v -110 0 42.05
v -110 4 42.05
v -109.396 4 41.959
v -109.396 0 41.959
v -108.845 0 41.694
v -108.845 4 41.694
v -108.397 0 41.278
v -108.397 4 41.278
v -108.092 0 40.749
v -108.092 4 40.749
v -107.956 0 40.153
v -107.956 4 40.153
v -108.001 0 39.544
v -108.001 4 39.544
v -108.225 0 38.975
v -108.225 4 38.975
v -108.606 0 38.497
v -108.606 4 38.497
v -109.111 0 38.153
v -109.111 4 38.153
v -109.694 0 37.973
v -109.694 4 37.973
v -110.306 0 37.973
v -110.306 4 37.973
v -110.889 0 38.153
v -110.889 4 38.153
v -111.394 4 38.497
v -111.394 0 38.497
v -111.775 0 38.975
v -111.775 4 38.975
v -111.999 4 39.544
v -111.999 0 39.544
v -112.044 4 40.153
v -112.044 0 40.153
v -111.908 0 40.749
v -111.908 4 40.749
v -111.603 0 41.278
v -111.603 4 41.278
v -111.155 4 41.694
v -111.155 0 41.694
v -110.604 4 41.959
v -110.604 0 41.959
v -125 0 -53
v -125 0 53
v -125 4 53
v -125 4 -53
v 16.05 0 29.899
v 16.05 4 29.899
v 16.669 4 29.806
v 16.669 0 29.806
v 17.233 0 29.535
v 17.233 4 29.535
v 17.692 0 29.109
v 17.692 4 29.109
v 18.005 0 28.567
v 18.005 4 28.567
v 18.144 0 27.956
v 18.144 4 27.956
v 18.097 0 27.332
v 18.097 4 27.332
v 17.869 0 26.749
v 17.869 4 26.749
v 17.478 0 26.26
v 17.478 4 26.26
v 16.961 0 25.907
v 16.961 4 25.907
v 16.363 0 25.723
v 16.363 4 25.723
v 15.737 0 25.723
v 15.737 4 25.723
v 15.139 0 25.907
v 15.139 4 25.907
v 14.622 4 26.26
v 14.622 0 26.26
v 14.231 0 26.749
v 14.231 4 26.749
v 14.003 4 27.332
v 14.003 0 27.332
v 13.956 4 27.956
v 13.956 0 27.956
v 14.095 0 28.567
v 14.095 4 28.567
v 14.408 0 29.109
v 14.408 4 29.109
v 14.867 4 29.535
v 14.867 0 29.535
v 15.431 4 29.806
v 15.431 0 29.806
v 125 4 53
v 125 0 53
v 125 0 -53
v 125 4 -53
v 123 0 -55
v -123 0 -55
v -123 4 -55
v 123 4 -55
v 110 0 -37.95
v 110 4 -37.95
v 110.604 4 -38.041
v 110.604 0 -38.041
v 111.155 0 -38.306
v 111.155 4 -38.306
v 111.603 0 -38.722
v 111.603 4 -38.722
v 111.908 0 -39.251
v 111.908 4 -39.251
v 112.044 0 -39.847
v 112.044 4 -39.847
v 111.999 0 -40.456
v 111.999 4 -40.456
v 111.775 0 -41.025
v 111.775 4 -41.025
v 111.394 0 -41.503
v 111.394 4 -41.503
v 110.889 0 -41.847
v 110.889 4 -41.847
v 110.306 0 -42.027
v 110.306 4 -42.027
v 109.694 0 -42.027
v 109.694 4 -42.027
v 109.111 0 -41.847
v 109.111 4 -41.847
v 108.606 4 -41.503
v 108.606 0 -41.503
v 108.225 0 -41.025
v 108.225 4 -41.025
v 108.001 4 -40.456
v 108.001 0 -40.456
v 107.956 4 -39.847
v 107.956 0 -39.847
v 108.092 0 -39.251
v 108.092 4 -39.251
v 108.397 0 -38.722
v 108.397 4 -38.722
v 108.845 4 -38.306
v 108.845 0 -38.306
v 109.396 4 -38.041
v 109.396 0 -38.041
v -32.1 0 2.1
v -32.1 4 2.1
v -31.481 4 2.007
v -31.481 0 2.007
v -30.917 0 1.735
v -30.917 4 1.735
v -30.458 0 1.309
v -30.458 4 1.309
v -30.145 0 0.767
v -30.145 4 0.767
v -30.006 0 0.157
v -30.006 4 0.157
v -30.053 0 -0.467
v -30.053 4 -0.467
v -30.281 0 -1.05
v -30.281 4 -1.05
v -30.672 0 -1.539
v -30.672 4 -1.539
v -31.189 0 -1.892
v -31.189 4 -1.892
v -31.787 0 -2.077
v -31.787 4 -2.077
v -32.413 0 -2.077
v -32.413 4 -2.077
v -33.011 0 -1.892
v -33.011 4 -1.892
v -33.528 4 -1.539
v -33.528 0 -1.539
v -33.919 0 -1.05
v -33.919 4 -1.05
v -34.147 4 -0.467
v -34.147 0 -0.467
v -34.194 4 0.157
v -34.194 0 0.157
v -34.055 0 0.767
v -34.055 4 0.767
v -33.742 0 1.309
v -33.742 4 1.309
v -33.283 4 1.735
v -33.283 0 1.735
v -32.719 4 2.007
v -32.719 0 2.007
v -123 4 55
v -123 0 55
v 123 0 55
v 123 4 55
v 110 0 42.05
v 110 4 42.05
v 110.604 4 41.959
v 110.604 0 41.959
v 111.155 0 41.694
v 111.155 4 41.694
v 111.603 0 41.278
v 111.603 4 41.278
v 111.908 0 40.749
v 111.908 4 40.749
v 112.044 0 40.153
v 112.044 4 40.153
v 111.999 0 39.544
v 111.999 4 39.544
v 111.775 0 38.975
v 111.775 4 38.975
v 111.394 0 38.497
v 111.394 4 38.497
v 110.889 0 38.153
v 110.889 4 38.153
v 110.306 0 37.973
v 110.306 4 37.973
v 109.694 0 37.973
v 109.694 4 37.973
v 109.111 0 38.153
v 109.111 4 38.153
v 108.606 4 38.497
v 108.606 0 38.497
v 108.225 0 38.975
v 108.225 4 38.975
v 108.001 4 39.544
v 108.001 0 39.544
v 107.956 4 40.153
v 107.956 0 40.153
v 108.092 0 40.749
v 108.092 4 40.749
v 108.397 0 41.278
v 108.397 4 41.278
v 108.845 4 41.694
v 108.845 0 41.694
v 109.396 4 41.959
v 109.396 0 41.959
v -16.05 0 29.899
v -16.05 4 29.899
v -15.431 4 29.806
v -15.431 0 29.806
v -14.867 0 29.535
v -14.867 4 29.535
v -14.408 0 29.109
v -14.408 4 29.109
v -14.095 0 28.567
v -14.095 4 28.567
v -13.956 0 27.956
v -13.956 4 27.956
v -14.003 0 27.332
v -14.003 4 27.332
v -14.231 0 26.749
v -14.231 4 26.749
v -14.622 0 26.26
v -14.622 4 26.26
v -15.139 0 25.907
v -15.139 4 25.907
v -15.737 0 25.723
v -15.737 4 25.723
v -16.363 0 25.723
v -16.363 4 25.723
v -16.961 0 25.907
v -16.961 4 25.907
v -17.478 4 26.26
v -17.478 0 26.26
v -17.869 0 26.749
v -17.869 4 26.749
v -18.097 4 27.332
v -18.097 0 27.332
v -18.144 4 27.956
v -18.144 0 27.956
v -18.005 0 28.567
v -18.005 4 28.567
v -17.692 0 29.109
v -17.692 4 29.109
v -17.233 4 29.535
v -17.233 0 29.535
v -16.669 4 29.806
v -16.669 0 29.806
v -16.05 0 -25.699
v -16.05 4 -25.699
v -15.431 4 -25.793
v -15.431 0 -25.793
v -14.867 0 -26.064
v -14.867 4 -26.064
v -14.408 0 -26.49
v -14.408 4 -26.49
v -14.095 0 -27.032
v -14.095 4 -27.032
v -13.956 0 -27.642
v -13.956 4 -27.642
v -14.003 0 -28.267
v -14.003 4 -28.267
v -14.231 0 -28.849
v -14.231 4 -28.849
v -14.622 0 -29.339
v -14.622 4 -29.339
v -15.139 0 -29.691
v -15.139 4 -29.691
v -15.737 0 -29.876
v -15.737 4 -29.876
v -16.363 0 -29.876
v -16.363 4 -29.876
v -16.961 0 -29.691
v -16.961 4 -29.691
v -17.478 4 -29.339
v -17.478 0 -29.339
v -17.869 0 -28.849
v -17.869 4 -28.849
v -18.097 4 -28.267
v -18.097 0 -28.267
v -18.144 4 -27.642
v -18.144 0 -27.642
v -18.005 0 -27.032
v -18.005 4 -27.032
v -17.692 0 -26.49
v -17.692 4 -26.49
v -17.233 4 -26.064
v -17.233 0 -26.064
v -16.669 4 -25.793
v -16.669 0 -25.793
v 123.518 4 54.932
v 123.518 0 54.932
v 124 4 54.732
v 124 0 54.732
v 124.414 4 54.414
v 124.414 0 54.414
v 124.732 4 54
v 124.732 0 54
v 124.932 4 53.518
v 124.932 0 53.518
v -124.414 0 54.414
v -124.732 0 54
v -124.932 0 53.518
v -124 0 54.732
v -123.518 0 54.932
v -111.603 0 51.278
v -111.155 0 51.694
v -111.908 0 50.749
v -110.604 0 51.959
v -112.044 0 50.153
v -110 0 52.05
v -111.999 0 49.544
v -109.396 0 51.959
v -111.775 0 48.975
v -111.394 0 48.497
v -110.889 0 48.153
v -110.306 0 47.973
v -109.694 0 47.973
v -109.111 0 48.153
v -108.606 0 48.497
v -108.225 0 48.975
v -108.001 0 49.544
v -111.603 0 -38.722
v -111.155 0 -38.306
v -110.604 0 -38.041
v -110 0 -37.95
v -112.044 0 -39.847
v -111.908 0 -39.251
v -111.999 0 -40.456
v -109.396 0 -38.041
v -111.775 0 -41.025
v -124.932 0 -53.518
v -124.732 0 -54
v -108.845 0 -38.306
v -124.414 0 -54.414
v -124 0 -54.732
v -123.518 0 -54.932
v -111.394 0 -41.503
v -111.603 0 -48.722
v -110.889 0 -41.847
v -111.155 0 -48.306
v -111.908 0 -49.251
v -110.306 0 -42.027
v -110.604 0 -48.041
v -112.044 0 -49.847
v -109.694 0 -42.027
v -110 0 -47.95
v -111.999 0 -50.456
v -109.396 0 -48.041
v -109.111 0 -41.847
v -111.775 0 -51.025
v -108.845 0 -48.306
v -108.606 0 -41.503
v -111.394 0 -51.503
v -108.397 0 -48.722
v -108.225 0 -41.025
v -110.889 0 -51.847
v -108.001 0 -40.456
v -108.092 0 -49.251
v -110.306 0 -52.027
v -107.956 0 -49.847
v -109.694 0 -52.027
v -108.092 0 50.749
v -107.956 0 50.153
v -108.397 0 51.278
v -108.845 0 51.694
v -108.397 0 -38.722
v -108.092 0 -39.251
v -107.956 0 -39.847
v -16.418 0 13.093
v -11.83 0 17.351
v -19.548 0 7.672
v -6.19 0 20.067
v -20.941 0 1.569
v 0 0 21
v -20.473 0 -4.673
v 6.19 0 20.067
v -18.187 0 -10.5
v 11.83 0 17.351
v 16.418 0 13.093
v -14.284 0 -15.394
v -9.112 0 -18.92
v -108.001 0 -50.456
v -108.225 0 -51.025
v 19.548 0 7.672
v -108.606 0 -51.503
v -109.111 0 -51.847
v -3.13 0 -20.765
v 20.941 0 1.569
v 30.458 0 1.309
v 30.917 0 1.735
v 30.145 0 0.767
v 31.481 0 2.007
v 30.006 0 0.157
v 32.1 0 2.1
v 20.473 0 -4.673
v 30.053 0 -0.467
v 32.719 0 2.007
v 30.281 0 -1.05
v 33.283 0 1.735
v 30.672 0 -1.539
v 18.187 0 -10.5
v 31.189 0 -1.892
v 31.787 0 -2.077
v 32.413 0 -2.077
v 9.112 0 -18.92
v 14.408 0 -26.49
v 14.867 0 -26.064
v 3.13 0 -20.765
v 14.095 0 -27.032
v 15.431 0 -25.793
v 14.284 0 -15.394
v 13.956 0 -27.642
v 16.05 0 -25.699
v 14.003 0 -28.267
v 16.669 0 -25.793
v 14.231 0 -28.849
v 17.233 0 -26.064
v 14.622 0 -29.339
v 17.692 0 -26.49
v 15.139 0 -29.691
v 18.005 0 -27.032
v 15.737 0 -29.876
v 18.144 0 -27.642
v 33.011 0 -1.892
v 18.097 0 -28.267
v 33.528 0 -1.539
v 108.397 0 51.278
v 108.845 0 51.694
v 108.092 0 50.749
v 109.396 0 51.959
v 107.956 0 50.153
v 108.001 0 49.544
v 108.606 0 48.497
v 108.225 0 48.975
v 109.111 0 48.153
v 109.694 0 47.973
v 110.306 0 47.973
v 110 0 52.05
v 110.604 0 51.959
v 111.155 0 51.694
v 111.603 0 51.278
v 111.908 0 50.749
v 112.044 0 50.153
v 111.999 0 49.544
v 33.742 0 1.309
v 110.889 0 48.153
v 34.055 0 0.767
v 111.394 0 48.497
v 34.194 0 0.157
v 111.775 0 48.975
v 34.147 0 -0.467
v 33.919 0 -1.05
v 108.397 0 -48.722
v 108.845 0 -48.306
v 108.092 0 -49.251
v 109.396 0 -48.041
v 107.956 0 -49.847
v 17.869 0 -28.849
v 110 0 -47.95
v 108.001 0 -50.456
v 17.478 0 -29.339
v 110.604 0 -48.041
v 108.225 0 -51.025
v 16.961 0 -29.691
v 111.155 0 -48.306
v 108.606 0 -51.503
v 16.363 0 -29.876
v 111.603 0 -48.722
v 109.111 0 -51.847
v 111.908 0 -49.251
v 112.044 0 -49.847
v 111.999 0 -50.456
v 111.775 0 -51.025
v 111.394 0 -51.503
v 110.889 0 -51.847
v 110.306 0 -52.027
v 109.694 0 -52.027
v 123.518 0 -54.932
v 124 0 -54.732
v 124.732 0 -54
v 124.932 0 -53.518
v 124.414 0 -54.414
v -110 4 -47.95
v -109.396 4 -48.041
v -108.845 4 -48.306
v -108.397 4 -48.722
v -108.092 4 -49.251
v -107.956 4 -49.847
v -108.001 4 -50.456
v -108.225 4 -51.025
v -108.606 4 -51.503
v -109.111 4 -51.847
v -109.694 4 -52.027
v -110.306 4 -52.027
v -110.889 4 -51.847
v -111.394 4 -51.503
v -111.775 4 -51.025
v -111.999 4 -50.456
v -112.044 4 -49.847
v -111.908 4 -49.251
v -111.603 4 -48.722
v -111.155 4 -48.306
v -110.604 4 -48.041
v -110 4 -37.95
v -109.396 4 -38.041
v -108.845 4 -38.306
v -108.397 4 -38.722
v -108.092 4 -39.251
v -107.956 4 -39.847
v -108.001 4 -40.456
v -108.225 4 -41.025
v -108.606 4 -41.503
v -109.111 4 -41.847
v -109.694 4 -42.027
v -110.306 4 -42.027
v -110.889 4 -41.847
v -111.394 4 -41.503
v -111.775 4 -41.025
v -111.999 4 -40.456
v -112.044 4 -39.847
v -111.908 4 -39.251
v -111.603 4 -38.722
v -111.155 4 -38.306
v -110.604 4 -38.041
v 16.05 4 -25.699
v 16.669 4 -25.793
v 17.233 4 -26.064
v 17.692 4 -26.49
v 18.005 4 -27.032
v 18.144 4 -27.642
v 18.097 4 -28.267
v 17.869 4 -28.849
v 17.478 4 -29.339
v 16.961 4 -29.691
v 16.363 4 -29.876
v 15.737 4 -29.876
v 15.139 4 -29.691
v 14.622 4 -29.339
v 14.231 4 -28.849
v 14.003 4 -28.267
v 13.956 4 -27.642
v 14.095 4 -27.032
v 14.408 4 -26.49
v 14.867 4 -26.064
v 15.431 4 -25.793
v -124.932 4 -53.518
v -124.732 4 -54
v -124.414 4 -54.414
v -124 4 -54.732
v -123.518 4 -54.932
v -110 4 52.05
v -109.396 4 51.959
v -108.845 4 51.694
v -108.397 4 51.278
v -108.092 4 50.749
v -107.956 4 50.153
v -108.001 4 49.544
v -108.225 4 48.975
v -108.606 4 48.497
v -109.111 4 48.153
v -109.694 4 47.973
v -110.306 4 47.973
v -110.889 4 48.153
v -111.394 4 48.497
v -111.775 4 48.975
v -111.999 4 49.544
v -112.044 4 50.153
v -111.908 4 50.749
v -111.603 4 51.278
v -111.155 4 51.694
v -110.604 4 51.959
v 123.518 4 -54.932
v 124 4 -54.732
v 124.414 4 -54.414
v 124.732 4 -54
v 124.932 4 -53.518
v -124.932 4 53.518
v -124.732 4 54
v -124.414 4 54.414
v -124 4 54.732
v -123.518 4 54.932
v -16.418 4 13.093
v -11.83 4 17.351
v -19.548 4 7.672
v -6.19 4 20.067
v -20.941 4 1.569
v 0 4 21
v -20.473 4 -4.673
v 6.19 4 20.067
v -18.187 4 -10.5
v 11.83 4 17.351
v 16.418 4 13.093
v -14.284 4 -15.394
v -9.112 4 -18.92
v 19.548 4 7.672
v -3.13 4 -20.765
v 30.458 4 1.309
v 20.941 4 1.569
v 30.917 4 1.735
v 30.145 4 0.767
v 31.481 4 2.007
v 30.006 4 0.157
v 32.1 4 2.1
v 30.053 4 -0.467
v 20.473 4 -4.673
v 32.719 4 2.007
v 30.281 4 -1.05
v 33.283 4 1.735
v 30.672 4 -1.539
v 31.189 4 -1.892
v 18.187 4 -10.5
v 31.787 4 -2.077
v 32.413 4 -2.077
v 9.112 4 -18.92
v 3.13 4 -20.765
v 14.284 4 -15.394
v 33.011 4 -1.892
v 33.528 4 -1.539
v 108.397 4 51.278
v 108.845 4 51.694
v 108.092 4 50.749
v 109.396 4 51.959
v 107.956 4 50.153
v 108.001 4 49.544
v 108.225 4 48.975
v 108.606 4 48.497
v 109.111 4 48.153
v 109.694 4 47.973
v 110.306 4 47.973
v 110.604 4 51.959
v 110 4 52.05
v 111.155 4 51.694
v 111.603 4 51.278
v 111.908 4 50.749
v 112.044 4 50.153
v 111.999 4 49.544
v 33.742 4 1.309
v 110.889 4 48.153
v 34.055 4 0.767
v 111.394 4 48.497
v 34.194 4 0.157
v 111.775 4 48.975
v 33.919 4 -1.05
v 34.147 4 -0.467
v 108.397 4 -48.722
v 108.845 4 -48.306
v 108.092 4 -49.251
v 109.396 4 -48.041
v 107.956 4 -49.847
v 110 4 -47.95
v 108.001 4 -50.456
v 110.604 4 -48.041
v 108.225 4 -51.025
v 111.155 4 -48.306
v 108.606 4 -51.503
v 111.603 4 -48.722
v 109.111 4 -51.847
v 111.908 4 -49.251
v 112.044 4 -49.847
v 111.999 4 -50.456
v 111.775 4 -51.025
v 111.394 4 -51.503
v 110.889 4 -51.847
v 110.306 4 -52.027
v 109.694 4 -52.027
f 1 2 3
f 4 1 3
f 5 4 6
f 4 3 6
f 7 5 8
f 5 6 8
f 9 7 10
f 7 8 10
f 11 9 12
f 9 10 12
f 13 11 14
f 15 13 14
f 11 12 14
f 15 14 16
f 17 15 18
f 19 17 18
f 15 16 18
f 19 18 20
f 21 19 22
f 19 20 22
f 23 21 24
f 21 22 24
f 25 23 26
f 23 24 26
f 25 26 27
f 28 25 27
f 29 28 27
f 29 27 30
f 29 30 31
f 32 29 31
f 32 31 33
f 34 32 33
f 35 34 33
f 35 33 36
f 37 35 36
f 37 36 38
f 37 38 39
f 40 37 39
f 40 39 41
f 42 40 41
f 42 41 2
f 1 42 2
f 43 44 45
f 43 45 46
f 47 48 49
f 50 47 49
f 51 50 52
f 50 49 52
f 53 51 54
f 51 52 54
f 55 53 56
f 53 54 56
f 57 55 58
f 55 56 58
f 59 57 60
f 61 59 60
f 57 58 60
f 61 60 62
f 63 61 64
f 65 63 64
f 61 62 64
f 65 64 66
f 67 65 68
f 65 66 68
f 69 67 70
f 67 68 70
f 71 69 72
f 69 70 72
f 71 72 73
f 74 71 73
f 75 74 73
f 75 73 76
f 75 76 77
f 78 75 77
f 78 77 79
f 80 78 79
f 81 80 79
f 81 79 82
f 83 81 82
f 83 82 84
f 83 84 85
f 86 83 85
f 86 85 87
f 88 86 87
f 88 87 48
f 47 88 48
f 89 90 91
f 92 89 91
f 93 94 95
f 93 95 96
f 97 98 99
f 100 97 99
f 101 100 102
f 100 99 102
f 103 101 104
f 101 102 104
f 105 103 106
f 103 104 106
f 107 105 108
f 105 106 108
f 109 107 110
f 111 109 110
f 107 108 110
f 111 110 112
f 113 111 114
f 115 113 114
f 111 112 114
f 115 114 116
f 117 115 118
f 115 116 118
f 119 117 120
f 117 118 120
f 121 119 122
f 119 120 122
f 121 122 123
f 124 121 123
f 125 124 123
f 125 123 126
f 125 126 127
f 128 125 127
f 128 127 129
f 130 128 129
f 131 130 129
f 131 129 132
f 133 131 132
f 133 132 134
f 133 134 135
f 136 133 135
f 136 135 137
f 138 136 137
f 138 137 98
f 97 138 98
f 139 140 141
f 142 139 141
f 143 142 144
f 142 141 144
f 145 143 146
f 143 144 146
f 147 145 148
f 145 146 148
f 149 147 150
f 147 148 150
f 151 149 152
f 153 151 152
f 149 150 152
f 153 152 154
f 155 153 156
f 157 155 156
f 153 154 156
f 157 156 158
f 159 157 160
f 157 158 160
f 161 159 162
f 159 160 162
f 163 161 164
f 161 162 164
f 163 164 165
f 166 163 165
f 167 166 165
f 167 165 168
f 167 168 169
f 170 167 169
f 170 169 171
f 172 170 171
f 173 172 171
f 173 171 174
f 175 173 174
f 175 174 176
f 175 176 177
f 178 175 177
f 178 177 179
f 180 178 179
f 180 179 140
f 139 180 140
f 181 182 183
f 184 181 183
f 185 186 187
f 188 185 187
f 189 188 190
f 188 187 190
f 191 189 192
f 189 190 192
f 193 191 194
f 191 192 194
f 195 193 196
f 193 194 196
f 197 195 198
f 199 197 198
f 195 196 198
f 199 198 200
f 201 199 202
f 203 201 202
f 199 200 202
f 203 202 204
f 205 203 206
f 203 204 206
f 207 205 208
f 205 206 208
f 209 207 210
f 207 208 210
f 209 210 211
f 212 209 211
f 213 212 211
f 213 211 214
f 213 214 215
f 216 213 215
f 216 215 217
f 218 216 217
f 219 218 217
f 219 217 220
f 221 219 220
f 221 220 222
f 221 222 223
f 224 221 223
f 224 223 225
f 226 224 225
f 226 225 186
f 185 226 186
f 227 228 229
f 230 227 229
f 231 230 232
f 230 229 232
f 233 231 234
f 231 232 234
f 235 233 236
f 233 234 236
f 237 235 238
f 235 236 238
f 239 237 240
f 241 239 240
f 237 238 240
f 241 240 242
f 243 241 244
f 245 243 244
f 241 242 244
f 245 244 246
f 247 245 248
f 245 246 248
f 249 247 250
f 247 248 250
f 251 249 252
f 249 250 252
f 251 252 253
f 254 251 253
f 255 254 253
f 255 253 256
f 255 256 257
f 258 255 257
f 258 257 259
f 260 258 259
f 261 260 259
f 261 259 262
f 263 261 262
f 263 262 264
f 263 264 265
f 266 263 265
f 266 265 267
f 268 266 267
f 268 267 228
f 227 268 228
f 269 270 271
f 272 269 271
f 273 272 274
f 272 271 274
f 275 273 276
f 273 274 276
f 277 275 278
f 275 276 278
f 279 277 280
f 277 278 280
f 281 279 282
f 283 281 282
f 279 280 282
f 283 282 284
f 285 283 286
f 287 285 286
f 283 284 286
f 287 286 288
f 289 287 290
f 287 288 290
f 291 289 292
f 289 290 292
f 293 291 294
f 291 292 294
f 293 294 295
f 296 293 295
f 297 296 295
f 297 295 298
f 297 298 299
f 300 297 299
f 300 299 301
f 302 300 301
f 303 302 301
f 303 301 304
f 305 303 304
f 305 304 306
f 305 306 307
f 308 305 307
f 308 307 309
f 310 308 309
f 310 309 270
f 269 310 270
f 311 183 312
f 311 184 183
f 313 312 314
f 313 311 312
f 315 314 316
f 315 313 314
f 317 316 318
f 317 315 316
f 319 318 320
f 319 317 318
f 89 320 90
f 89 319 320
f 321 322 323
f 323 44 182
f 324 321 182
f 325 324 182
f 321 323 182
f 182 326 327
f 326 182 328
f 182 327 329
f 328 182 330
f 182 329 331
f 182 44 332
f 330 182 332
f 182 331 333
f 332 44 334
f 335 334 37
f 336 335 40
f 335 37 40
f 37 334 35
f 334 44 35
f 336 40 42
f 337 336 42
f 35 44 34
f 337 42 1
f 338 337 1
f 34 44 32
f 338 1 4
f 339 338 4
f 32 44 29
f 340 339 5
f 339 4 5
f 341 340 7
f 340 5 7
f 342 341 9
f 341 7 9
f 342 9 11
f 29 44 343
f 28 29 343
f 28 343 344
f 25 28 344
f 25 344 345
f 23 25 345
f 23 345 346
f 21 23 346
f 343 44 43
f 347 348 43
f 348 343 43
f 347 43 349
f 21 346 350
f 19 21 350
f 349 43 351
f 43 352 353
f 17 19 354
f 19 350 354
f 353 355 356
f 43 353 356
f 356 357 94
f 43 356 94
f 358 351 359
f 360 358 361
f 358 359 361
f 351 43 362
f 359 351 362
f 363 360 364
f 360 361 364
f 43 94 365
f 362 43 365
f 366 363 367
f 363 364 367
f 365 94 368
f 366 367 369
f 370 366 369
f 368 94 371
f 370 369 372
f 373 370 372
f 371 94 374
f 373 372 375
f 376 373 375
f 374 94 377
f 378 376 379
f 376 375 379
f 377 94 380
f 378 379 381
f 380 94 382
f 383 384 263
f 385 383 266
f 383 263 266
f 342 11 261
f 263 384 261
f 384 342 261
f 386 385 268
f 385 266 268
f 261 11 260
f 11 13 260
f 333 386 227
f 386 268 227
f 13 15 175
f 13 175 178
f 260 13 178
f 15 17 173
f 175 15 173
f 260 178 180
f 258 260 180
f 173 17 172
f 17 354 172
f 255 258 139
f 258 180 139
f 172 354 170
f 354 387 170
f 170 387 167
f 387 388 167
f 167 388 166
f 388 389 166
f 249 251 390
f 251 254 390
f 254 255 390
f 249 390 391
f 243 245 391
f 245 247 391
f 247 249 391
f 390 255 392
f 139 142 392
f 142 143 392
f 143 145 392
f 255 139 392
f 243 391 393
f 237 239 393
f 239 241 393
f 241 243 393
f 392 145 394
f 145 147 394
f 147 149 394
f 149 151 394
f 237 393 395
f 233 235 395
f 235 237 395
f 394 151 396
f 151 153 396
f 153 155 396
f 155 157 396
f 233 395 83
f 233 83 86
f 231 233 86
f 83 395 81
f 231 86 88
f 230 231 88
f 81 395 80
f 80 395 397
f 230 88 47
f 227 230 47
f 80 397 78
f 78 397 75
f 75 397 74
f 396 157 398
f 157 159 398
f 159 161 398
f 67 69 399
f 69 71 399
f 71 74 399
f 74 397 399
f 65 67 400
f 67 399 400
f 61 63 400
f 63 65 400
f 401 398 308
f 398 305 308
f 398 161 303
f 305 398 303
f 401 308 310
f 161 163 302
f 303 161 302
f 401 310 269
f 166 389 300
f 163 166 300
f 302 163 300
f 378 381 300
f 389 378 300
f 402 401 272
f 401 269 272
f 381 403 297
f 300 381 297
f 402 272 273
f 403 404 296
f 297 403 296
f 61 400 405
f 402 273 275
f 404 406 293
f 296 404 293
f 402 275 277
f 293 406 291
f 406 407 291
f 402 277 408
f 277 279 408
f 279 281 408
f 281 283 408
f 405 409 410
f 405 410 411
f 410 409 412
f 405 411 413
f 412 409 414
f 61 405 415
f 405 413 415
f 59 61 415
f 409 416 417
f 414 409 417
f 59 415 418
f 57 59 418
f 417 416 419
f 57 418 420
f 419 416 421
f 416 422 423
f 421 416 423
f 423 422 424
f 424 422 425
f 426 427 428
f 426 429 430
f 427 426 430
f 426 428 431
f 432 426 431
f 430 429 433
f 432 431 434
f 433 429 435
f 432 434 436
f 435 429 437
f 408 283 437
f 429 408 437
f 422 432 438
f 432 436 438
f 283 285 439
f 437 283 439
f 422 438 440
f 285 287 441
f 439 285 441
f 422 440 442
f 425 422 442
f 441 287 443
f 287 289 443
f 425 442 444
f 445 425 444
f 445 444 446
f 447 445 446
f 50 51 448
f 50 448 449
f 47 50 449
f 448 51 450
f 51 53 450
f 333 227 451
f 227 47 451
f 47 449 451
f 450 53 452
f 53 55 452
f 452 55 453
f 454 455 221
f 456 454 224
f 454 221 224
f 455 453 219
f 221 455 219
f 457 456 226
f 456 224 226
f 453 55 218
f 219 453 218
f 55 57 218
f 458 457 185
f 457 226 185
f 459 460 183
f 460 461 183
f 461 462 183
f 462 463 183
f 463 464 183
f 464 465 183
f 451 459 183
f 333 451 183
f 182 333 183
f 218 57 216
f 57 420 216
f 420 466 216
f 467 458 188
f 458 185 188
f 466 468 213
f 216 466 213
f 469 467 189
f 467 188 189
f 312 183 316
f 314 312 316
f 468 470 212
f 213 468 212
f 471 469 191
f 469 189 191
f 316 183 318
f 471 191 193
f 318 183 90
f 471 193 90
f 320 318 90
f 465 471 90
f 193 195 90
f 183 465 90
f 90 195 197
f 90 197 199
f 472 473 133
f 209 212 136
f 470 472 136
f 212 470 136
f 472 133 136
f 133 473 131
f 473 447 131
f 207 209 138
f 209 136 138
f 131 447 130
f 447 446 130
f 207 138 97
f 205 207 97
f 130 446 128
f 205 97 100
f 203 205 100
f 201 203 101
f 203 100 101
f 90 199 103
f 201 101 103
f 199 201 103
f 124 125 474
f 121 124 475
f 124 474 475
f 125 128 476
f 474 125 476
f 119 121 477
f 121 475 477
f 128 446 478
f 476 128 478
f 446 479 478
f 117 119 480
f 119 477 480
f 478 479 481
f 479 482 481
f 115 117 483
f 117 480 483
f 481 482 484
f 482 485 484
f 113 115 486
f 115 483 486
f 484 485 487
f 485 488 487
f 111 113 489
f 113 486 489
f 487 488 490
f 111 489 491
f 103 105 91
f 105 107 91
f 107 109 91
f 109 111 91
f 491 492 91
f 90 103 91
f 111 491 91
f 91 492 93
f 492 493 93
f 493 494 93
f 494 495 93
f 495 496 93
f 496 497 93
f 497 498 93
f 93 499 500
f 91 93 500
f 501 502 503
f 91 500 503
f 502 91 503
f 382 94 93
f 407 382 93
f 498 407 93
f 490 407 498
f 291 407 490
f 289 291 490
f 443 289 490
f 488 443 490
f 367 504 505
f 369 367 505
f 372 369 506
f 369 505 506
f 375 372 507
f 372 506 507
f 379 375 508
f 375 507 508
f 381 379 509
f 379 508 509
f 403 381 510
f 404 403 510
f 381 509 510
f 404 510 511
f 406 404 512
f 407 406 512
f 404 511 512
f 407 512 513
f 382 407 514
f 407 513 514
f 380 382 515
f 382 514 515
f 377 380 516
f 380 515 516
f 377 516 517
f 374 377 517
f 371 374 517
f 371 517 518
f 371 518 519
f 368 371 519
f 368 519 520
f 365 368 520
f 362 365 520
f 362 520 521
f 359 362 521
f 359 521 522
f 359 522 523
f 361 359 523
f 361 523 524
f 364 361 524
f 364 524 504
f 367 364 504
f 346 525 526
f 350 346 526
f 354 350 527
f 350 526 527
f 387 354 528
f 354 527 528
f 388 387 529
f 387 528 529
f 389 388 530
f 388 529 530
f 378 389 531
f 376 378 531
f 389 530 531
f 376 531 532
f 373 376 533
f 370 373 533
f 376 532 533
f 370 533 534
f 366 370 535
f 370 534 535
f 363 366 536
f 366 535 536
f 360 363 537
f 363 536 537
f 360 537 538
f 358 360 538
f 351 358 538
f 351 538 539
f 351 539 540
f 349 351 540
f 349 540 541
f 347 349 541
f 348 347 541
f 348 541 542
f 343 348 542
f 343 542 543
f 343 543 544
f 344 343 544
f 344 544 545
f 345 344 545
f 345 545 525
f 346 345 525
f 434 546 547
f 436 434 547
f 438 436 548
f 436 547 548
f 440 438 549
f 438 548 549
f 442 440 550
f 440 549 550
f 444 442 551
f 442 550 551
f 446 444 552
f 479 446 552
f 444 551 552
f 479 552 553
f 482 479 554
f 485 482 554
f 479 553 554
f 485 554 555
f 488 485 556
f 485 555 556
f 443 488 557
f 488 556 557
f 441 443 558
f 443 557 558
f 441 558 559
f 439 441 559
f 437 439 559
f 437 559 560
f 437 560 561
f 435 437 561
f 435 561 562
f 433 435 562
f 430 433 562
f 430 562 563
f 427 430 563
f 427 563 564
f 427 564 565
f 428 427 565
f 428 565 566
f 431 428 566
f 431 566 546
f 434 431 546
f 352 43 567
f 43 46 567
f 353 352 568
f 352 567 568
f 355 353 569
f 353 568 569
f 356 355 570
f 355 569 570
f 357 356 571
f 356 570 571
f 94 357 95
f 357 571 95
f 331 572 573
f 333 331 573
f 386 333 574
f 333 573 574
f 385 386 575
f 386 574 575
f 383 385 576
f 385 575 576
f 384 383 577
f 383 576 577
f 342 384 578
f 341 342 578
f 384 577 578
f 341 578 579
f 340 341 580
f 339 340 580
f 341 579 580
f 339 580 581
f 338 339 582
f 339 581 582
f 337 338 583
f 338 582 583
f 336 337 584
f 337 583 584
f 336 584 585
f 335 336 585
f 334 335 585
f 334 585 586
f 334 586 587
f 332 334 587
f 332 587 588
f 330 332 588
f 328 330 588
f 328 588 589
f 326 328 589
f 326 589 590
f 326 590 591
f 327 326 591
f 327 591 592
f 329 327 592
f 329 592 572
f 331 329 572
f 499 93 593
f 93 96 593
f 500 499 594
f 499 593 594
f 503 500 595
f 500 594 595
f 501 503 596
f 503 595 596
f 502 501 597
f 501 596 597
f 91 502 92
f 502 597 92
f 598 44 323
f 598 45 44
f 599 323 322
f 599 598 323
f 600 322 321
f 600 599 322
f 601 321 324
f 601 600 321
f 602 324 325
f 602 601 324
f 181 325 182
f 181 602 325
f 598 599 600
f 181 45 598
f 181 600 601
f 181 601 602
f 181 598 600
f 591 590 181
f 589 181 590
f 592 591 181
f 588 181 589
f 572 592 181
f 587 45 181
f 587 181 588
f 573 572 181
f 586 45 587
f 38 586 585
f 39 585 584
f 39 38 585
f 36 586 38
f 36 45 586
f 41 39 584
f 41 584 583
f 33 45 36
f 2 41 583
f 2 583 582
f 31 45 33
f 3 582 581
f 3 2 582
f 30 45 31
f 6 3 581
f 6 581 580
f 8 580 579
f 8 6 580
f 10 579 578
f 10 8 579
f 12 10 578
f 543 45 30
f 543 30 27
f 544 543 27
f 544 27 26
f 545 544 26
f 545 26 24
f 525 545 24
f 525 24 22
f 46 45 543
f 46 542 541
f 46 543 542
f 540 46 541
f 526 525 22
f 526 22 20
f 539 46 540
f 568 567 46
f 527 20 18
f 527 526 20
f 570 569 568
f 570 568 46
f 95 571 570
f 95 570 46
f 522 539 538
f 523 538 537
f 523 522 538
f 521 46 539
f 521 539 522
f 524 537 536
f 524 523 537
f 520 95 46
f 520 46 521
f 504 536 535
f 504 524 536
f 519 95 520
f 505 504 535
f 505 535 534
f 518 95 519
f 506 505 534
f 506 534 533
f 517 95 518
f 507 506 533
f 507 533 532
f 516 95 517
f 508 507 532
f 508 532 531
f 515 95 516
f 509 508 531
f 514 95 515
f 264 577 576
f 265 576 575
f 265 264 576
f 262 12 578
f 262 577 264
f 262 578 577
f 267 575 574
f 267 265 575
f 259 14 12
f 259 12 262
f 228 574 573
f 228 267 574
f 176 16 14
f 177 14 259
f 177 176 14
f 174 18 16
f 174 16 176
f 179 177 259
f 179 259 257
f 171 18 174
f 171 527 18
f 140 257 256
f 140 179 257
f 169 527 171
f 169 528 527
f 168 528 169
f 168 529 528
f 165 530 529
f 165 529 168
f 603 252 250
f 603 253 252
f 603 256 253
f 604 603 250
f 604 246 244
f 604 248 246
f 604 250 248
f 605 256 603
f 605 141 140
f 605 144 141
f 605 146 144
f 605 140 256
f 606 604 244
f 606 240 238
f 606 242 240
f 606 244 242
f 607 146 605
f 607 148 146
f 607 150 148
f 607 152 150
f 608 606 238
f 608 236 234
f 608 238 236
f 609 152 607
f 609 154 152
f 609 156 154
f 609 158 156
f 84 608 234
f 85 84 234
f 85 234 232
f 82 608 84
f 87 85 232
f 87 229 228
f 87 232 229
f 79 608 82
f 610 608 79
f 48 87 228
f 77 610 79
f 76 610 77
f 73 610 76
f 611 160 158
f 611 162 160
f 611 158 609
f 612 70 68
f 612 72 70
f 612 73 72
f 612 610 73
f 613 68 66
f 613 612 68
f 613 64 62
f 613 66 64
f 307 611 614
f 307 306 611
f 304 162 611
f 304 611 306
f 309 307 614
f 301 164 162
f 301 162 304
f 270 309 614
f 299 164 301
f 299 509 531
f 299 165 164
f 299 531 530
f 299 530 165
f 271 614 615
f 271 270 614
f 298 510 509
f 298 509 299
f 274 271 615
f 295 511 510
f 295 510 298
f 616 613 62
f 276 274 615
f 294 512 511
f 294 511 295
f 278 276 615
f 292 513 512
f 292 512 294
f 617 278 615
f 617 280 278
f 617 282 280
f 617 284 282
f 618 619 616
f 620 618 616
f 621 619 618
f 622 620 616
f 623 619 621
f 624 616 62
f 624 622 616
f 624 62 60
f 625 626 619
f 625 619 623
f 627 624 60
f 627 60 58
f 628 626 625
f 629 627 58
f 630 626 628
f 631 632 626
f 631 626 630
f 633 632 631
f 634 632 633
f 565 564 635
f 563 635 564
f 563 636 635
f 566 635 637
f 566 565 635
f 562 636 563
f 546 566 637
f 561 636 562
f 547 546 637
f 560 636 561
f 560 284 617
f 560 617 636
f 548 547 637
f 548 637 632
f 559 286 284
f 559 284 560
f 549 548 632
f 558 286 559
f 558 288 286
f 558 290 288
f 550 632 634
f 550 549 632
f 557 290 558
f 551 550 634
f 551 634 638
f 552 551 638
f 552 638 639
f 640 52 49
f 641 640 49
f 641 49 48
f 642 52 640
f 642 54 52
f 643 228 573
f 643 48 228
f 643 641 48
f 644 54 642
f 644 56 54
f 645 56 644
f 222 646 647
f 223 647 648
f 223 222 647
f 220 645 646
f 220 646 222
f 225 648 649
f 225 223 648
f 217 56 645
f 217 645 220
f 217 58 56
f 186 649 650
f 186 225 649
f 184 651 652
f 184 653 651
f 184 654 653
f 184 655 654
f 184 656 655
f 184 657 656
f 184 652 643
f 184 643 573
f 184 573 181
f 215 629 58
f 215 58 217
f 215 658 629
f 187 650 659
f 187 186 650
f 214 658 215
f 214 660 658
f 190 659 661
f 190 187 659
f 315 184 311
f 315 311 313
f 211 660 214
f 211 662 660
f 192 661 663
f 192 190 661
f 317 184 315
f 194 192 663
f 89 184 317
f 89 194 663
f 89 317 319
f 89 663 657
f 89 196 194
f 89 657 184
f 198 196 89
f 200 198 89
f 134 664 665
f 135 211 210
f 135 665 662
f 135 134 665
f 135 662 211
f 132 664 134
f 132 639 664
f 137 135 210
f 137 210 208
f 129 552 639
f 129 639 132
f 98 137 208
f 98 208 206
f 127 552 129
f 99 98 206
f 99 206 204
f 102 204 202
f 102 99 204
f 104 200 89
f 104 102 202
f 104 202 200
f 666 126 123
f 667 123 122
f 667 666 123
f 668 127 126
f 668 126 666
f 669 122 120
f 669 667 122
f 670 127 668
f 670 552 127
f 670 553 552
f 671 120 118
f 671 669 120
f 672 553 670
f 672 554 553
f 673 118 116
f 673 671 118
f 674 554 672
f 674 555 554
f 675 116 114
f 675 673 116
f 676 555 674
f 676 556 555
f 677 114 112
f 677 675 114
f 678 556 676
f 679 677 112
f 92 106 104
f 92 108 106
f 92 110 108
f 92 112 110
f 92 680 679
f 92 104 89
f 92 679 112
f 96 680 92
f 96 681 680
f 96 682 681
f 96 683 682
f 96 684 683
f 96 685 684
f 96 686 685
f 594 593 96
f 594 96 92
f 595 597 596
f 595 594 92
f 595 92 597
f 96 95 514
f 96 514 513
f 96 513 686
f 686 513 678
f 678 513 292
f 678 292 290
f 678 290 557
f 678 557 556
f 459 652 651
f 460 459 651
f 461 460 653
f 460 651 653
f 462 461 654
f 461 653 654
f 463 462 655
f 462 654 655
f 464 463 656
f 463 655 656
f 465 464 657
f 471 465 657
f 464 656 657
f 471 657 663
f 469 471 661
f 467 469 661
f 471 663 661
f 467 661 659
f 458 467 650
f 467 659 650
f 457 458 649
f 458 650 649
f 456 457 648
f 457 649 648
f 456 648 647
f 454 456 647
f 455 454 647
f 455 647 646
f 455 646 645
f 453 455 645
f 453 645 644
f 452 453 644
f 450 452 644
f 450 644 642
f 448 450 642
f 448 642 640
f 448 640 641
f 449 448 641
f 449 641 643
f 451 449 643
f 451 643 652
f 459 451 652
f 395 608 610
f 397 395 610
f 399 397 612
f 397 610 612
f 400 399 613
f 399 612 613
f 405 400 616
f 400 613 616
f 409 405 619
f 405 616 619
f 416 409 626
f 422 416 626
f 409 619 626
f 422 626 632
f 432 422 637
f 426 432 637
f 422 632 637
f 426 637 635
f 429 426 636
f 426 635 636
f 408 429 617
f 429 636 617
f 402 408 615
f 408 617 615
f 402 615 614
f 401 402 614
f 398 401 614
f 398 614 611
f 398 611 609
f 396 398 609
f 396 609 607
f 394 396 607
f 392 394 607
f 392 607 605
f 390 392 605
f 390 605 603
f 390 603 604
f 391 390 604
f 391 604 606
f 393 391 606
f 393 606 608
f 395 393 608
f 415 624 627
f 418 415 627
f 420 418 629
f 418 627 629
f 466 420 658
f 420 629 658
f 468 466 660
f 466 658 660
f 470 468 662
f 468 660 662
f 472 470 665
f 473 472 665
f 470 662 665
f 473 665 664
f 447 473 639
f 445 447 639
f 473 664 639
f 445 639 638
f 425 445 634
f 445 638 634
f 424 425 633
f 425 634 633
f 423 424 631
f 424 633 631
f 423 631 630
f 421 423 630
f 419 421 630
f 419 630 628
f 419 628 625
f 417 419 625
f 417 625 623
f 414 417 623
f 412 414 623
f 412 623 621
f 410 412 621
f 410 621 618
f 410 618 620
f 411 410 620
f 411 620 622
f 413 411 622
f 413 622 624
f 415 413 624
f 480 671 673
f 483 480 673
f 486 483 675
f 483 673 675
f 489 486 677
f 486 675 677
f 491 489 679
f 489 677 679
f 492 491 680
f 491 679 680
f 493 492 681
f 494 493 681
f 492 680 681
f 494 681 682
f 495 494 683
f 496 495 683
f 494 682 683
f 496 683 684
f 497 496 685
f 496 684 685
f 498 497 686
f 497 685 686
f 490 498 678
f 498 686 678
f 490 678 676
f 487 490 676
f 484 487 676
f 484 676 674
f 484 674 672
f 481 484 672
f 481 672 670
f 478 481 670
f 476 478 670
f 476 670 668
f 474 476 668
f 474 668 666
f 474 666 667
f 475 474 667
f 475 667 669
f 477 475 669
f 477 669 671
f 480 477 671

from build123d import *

# Parameters (mm, degrees)
SKETCH_1_W          = 250
SKETCH_1_H          = 110
EXTRUDE_1_DEPTH     = 4
SKETCH_3_R          = 2.1
CUT_EXTRUDE_1_DEPTH = 10
SKETCH_4_R          = 21
CUT_EXTRUDE_2_DEPTH = 10
SKETCH_5_R          = 2.05
CUT_EXTRUDE_3_DEPTH = 10
FILLET_1_R          = 2


with BuildPart() as part:
    # 草图1 → 凸台-拉伸1 (new body)
    with BuildSketch(Plane(origin=(0, 0, 0), x_dir=(1, 0, 0), z_dir=(0, 1, 0))):
        Rectangle(SKETCH_1_W, SKETCH_1_H)
    extrude(amount=EXTRUDE_1_DEPTH)

    # 草图3 → 切除-拉伸1 (cut)
    with BuildSketch(Plane(origin=(0, 4, 0), x_dir=(1, 0, 0), z_dir=(0, 1, 0))):
        with Locations(Location((-32.1, 0, 0), (0, 0, 270))):
            Circle(SKETCH_3_R)
        with Locations(Location((-16.05, 27.799415461, 0), (0, 0, 270))):
            Circle(SKETCH_3_R)
        with Locations(Location((16.05, 27.799415461, 0), (0, 0, 270))):
            Circle(SKETCH_3_R)
        with Locations(Location((32.1, 0, 0), (0, 0, 270))):
            Circle(SKETCH_3_R)
        with Locations(Location((16.05, -27.799415461, 0), (0, 0, 270))):
            Circle(SKETCH_3_R)
        with Locations(Location((-16.05, -27.799415461, 0), (0, 0, 270))):
            Circle(SKETCH_3_R)
    extrude(amount=-CUT_EXTRUDE_1_DEPTH, mode=Mode.SUBTRACT)

    # 草图4 → 切除-拉伸2 (cut)
    with BuildSketch(Plane(origin=(0, 4, 0), x_dir=(1, 0, 0), z_dir=(0, 1, 0))):
        with Locations(Location((0, 0, 0), (0, 0, 270))):
            Circle(SKETCH_4_R)
    extrude(amount=-CUT_EXTRUDE_2_DEPTH, mode=Mode.SUBTRACT)

    # 草图5 → 切除-拉伸3 (cut)
    with BuildSketch(Plane(origin=(0, 4, 0), x_dir=(1, 0, 0), z_dir=(0, 1, 0))):
        with Locations(Location((-110, 50, 0), (0, 0, 270))):
            Circle(SKETCH_5_R)
        with Locations(Location((-110, 40, 0), (0, 0, 270))):
            Circle(SKETCH_5_R)
        with Locations(Location((110, 40, 0), (0, 0, 270))):
            Circle(SKETCH_5_R)
        with Locations(Location((110, 50, 0), (0, 0, 270))):
            Circle(SKETCH_5_R)
        with Locations(Location((110, -50, 0), (0, 0, 270))):
            Circle(SKETCH_5_R)
        with Locations(Location((110, -40, 0), (0, 0, 270))):
            Circle(SKETCH_5_R)
        with Locations(Location((-110, -50, 0), (0, 0, 270))):
            Circle(SKETCH_5_R)
        with Locations(Location((-110, -40, 0), (0, 0, 270))):
            Circle(SKETCH_5_R)
    extrude(amount=-CUT_EXTRUDE_3_DEPTH, mode=Mode.SUBTRACT)

    # 圆角1
    fillet_1_edges = [part.edges().sort_by_distance(p)[0] for p in [
        (125, 2, 55),
        (-125, 2, 55),
        (-125, 2, -55),
        (125, 2, -55),
    ]]
    fillet(fillet_1_edges, radius=FILLET_1_R)


solid = part.part
